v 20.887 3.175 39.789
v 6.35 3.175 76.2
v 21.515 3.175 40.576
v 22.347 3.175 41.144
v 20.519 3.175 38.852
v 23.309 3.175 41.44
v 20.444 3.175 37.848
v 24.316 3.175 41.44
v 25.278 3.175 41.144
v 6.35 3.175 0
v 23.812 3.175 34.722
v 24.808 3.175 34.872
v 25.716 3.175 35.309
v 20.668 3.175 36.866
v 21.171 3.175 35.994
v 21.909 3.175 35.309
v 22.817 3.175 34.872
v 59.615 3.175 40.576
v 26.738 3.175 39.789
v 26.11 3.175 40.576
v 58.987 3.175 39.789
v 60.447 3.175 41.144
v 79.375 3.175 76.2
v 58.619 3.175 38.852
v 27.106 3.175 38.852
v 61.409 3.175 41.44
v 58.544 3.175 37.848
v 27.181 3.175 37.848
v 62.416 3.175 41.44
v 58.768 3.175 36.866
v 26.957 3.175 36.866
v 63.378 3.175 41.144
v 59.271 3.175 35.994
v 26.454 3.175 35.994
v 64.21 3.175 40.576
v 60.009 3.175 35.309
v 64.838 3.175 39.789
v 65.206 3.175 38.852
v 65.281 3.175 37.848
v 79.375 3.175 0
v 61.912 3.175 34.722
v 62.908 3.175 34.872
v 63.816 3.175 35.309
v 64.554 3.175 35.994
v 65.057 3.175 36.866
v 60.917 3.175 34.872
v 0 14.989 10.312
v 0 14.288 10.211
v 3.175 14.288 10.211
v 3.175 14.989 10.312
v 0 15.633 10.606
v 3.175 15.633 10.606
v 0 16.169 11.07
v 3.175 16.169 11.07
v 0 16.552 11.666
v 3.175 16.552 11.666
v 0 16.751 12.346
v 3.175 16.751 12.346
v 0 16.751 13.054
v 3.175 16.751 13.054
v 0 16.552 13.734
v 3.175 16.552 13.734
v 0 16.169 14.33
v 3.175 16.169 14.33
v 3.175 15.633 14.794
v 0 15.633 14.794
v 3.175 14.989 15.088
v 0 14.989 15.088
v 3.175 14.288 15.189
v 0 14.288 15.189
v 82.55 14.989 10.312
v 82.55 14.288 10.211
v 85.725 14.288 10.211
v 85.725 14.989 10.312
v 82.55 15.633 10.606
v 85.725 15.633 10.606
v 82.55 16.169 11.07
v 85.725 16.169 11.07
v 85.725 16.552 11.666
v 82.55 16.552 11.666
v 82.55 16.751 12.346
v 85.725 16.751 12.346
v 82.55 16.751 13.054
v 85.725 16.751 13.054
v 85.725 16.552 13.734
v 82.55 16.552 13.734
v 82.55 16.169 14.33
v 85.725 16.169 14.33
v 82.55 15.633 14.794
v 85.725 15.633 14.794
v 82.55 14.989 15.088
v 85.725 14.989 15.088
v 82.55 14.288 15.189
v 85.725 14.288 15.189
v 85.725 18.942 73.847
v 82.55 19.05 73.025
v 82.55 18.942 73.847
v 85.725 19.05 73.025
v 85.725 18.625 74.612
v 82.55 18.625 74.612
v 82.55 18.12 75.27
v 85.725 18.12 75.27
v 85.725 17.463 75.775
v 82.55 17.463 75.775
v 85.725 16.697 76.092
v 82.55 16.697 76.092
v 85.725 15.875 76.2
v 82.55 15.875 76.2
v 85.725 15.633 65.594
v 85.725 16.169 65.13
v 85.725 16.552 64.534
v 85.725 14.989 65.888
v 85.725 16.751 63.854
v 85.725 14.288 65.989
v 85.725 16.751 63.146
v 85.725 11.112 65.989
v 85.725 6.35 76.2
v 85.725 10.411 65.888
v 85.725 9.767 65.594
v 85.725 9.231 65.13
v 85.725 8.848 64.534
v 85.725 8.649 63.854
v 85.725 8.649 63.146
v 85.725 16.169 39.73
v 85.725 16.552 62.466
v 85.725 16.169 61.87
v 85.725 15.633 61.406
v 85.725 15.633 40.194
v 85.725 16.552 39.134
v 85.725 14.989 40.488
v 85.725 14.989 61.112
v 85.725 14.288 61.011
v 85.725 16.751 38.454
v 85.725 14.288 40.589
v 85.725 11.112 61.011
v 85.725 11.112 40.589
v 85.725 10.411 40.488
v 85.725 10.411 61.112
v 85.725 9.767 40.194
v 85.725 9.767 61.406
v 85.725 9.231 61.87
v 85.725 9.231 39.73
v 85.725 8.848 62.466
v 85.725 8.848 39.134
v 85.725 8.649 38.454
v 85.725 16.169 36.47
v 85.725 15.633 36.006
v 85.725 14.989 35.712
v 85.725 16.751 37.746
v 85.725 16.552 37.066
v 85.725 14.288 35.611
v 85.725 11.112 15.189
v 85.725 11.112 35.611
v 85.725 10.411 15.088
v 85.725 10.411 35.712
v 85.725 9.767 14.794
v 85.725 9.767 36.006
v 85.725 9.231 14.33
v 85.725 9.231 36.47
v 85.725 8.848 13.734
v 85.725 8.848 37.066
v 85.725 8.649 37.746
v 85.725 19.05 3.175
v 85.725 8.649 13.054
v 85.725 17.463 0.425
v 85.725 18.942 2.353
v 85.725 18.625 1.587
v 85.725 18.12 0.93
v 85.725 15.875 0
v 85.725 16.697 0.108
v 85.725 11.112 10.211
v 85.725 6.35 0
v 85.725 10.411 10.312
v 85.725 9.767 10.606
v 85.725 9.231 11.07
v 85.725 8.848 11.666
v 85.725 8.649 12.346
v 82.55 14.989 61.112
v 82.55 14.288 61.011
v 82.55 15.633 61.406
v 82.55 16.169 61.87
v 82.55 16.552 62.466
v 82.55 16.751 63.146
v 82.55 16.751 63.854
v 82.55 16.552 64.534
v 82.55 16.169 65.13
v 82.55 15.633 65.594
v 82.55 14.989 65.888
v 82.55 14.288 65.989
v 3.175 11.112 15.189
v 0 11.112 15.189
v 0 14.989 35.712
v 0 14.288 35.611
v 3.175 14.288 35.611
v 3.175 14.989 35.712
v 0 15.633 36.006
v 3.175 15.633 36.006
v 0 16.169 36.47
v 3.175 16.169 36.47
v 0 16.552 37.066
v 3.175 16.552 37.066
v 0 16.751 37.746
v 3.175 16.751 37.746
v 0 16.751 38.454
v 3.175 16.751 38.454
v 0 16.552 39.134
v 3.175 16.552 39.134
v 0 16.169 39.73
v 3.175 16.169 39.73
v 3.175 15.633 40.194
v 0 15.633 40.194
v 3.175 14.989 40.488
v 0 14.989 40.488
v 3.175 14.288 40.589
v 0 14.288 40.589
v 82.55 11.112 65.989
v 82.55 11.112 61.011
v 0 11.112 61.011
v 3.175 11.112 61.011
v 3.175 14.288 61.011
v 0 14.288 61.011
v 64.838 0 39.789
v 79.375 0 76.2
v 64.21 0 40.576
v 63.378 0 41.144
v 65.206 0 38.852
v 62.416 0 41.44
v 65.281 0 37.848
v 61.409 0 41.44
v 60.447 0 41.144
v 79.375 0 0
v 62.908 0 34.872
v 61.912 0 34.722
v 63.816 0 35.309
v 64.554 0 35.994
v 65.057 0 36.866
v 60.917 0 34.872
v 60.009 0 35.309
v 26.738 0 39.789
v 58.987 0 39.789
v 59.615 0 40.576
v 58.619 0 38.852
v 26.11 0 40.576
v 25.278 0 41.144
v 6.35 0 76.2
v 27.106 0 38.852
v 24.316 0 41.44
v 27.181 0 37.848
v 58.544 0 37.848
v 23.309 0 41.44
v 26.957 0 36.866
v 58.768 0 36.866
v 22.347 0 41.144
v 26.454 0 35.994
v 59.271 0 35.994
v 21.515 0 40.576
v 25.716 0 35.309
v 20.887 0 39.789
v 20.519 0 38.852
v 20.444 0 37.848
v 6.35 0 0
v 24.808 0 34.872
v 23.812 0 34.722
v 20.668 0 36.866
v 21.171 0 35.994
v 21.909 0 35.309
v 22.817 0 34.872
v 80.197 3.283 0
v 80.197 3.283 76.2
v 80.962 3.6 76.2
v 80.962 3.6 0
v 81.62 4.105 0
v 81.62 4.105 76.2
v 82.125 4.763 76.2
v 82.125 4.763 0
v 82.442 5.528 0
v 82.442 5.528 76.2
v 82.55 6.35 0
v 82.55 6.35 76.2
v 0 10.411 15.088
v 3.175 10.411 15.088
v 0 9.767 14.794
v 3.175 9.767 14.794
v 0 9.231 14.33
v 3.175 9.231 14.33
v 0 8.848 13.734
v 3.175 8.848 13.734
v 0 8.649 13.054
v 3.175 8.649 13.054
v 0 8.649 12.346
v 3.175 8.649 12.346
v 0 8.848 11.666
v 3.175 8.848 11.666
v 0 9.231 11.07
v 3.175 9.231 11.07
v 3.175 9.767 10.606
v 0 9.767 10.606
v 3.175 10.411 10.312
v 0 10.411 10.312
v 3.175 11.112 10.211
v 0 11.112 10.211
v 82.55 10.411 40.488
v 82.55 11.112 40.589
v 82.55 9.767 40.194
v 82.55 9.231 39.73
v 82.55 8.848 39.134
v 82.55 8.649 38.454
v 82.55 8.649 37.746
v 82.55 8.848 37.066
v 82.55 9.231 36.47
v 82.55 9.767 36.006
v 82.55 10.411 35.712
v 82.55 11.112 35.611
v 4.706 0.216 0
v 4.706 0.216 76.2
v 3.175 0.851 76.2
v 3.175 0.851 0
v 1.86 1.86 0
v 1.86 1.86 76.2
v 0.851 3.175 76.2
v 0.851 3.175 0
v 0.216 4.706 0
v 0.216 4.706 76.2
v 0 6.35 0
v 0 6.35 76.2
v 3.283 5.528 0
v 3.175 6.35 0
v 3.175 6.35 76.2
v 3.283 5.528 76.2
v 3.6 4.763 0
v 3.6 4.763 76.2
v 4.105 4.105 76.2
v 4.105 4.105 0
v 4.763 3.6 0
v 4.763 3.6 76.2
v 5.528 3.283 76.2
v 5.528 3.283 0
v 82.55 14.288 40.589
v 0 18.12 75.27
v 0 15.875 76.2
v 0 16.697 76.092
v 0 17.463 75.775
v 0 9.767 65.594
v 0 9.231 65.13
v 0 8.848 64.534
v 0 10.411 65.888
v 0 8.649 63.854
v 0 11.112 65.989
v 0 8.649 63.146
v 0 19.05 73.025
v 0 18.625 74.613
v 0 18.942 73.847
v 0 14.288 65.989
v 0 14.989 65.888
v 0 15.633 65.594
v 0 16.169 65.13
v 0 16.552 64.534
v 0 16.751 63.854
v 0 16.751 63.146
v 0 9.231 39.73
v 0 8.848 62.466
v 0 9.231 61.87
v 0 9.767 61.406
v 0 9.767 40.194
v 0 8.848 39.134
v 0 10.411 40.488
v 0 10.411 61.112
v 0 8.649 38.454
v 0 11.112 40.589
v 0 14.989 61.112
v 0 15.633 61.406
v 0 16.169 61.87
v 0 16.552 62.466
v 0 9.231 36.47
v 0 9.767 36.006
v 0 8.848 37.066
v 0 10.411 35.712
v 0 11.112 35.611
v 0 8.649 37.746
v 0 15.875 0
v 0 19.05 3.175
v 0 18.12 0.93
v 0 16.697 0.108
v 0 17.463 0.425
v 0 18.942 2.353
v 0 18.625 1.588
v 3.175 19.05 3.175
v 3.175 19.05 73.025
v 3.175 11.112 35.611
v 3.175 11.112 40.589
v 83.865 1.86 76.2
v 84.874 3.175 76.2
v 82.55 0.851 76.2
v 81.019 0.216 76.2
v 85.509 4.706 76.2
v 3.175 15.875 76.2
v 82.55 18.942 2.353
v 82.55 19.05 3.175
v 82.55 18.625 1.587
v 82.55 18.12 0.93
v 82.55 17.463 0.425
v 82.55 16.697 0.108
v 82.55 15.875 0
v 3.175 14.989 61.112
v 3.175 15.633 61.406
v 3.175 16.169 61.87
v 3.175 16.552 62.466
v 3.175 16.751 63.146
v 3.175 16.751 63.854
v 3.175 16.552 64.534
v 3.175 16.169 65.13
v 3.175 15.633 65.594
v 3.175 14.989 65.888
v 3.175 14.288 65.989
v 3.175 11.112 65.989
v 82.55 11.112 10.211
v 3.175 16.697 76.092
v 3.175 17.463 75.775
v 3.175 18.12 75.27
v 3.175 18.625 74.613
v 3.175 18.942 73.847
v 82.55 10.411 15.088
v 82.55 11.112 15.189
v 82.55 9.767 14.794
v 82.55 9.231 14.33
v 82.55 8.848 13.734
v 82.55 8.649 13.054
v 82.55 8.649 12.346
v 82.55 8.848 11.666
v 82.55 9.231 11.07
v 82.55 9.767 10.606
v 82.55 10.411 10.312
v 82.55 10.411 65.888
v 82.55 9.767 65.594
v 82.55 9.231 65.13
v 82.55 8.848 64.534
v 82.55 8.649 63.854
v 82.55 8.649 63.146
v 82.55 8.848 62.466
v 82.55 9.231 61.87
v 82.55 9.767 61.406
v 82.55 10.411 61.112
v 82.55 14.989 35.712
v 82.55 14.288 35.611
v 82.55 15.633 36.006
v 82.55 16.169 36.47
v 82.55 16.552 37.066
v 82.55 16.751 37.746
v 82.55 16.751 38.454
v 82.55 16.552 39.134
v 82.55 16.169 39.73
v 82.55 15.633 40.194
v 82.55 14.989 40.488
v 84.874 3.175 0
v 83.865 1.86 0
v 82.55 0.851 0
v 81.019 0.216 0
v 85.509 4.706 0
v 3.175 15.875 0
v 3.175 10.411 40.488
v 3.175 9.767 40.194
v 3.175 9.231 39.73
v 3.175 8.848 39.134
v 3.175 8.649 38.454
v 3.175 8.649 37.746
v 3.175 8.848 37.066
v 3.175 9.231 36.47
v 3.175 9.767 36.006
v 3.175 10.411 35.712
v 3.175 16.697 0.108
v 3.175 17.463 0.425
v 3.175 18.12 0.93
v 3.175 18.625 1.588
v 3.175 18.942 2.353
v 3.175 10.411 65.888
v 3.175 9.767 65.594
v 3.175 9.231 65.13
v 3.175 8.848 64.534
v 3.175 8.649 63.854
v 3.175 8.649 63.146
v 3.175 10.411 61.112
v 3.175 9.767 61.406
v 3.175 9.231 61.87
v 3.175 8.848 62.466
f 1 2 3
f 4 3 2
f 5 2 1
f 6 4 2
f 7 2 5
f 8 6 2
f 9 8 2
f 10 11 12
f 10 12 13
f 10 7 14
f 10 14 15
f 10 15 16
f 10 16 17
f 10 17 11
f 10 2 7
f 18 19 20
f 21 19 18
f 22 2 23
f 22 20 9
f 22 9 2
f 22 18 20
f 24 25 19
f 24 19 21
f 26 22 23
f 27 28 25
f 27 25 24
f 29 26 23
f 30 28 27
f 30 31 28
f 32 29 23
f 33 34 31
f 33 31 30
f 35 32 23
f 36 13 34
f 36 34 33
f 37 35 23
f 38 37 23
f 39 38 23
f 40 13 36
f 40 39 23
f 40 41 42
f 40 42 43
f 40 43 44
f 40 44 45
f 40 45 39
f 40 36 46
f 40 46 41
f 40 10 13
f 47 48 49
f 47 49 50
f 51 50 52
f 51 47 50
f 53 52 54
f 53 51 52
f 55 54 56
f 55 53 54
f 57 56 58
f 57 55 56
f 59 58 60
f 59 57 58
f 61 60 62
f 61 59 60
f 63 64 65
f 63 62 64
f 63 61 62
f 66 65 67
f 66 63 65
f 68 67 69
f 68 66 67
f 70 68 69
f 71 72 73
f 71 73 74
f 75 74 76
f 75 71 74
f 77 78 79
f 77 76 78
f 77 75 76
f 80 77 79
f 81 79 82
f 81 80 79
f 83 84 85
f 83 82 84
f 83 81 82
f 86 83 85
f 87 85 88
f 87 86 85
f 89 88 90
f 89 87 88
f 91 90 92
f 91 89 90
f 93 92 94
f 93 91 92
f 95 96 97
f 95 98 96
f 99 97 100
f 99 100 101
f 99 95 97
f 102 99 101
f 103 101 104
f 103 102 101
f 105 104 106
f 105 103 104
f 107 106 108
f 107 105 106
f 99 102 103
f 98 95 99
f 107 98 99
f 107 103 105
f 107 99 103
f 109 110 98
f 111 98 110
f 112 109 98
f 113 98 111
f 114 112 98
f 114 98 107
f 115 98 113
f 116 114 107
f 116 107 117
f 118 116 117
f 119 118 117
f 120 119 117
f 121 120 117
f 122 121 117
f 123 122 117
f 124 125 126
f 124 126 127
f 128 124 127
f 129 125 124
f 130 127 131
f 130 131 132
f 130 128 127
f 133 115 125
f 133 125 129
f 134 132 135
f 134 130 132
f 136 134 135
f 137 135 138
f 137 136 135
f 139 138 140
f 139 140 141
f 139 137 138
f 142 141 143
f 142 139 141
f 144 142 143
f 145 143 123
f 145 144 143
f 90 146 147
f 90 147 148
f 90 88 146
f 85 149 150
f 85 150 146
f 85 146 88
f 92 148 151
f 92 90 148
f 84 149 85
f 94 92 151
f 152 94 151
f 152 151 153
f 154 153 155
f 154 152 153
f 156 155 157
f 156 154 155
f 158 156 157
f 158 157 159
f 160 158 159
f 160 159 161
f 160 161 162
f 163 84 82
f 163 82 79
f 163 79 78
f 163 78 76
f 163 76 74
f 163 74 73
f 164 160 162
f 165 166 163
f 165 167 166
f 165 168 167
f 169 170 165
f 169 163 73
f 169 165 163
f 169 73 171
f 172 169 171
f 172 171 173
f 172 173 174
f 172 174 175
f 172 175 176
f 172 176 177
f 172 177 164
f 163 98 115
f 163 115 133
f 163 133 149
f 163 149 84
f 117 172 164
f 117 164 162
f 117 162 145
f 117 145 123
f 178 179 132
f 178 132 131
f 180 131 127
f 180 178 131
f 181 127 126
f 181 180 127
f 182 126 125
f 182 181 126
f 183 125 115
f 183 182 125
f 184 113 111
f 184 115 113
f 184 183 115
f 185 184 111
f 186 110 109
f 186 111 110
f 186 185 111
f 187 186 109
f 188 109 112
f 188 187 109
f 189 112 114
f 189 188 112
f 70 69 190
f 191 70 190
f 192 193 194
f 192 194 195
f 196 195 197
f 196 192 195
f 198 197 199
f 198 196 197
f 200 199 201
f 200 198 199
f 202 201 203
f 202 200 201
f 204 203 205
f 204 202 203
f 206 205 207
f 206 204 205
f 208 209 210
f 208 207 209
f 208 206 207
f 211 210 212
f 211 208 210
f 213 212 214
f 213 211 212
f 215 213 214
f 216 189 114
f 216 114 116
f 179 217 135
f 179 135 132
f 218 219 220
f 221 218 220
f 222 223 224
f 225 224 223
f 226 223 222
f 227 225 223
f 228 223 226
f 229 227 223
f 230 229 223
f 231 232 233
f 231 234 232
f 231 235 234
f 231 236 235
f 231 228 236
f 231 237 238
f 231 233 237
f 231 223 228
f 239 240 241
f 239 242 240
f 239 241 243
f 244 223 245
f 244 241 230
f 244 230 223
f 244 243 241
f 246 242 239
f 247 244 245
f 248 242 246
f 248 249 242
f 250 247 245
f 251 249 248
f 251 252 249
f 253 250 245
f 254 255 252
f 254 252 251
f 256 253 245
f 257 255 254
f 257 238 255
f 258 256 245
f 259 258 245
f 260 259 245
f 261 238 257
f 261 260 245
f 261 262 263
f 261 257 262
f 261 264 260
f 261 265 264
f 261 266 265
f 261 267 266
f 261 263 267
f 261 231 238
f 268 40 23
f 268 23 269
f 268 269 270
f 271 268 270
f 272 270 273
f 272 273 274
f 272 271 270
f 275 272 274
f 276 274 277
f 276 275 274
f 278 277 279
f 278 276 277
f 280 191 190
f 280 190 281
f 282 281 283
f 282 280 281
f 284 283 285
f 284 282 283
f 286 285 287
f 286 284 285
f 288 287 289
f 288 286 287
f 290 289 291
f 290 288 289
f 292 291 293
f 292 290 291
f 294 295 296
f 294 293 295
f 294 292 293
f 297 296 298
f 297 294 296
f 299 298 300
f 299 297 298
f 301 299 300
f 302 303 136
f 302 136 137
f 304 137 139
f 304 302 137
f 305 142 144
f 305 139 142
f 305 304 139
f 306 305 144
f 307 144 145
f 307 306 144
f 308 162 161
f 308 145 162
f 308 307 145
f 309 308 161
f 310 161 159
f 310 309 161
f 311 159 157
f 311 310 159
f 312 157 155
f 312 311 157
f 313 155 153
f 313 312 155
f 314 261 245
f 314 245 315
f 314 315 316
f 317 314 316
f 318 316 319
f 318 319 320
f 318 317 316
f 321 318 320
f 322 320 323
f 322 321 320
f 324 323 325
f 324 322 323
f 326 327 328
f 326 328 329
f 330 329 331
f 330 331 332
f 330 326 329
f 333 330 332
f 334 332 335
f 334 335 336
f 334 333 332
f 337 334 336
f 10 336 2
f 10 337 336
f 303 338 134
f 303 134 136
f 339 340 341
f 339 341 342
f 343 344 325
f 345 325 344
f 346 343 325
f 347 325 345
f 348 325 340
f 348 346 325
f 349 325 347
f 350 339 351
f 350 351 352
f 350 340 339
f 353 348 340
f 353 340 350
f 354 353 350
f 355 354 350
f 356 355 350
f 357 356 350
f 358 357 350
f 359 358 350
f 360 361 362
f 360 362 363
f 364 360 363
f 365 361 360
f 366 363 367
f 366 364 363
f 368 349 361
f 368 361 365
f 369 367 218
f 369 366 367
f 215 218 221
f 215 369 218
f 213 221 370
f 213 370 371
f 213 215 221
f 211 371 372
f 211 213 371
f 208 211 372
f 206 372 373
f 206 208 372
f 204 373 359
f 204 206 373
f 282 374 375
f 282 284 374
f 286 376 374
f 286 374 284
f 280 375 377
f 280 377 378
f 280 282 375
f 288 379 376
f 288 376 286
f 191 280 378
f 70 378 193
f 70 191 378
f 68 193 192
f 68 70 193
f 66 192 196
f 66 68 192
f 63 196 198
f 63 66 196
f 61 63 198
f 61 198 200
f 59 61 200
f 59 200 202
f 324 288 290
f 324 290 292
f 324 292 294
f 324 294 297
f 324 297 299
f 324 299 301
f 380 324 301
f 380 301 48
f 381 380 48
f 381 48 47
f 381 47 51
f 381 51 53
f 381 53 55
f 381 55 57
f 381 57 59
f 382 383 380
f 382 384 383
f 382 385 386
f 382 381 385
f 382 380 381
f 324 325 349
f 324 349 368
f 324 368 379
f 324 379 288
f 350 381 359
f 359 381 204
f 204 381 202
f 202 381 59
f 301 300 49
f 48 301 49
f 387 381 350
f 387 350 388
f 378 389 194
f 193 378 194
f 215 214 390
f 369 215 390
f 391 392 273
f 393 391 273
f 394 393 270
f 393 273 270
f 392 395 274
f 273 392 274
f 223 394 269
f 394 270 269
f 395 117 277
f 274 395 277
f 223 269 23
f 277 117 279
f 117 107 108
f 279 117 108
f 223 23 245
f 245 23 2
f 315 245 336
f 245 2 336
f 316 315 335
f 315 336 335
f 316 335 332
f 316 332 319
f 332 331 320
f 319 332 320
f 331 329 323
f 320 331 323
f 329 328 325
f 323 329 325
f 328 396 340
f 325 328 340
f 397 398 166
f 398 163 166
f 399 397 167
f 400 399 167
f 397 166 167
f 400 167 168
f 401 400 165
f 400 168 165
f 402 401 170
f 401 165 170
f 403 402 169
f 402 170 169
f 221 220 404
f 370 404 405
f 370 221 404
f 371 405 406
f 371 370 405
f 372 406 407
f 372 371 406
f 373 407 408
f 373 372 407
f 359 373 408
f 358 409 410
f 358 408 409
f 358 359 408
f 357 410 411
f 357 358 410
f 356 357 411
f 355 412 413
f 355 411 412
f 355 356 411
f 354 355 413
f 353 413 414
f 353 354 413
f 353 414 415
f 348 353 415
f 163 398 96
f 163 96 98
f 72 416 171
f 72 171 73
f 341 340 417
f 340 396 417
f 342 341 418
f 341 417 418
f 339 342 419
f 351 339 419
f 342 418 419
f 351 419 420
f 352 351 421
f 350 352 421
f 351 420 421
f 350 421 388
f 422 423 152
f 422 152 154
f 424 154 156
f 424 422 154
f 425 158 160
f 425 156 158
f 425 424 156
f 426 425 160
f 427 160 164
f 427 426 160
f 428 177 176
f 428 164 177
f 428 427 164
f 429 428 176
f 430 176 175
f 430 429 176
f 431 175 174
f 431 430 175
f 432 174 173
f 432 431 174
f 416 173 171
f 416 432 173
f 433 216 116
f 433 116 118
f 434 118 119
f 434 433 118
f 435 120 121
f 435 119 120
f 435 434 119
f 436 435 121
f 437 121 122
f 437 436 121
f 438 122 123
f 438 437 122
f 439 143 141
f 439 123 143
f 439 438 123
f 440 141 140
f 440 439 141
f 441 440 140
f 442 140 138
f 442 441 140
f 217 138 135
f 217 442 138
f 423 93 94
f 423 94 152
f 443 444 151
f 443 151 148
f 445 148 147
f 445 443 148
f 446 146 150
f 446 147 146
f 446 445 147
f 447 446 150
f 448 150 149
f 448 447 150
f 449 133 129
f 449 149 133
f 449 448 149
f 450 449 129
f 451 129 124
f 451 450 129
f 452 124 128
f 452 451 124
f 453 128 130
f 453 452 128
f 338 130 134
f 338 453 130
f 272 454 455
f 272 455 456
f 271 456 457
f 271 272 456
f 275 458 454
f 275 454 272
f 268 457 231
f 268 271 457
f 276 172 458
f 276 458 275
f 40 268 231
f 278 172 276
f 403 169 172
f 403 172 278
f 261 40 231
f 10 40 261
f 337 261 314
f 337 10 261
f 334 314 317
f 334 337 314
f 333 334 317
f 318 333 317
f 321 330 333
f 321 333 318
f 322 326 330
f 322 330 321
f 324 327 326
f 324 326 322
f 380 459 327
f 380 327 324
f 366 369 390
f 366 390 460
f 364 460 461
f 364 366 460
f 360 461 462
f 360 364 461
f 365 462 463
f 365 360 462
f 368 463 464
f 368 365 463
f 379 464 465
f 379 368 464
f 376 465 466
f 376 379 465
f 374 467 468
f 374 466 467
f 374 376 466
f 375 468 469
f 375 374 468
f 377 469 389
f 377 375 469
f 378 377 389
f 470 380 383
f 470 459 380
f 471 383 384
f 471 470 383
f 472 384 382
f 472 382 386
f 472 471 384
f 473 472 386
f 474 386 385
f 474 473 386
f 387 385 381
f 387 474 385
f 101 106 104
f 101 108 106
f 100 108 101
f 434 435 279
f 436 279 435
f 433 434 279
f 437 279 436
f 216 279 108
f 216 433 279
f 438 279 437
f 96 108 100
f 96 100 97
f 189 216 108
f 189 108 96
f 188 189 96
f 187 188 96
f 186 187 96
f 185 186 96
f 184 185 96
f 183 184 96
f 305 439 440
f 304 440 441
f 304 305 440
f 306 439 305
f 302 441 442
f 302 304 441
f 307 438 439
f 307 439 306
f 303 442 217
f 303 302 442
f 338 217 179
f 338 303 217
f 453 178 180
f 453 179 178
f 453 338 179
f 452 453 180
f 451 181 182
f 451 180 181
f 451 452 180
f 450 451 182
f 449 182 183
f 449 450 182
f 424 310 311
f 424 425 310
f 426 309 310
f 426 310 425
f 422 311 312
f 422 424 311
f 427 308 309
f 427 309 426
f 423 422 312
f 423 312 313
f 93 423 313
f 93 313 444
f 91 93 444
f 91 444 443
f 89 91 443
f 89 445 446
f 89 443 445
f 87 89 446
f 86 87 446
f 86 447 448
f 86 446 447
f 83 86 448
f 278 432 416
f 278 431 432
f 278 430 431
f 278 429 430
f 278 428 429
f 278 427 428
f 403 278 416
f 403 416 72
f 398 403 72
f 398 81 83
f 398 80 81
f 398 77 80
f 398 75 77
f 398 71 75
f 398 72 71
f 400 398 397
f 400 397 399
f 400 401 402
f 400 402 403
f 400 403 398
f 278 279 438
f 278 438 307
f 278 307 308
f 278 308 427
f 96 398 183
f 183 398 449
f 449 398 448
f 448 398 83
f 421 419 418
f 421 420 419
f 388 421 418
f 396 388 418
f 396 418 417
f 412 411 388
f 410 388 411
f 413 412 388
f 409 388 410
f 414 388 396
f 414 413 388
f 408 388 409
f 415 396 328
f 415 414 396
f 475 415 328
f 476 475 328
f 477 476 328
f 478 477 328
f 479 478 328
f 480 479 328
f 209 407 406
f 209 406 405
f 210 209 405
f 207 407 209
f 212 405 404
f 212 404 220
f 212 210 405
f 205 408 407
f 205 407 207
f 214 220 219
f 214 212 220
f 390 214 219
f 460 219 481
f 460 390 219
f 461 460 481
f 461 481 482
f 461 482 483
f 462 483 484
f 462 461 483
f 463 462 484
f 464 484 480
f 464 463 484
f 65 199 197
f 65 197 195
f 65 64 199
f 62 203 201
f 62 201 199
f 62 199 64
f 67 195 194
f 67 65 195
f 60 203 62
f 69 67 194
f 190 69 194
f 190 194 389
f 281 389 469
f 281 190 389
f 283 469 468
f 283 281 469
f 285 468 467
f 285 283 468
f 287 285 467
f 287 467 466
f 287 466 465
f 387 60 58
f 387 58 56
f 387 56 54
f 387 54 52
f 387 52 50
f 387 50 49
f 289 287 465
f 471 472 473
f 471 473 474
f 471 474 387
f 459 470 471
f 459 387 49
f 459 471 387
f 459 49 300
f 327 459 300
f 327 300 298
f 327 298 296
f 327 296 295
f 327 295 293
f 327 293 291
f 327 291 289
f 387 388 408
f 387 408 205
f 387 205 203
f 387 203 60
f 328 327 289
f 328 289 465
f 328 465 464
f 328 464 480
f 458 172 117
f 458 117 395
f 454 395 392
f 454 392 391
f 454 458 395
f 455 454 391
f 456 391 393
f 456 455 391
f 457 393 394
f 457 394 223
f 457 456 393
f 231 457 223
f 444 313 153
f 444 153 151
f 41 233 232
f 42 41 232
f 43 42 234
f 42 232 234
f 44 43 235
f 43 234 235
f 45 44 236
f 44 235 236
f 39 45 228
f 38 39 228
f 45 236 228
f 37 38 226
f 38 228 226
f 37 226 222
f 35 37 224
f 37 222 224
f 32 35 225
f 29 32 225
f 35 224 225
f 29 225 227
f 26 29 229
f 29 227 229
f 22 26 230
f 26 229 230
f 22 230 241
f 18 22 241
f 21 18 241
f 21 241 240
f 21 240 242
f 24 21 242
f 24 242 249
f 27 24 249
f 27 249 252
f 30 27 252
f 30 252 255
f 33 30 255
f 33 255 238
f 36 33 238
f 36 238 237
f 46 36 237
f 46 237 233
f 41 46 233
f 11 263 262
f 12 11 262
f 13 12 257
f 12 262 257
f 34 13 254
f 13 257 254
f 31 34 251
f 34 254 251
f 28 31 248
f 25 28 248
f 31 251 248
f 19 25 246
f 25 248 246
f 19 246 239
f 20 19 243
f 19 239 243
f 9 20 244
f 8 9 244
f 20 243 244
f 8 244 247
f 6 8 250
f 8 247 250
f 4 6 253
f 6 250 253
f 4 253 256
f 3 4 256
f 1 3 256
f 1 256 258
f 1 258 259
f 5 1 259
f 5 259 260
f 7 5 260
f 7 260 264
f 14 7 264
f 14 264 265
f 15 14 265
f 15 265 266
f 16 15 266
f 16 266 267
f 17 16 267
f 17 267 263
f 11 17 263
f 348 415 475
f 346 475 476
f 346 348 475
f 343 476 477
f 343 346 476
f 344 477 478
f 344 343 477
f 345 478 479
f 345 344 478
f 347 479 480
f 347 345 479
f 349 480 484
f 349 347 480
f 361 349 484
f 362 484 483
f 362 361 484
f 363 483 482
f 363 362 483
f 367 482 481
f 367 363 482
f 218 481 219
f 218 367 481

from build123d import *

# Parameters (mm, degrees)
BASE_FLANGE1_DEPTH = 76.2
CUT_EXTRUDE1_DEPTH = 117.26744224
SKETCH7_R          = 3.3782
CUT_EXTRUDE2_DEPTH = 117.26744224
FILLET1_R          = 3.175


# Sheet-metal steps are written as plain solids
with BuildPart() as part:
    # Sketch1 → Base-Flange1 (new body)
    with BuildSketch(Plane.XY):
        with BuildLine():
            Line((85.725, 19.05), (85.725, 6.35))
            ThreePointArc((85.725, 6.35), (83.865128061, 1.859871939), (79.375, 0))
            Line((79.375, 0), (6.35, 0))
            ThreePointArc((6.35, 0), (1.859871939, 1.859871939), (0, 6.35))
            Line((0, 6.35), (0, 19.05))
            Line((0, 19.05), (3.175, 19.05))
            Line((3.175, 19.05), (3.175, 6.35))
            ThreePointArc((3.175, 6.35), (4.10493597, 4.10493597), (6.35, 3.175))
            Line((6.35, 3.175), (79.375, 3.175))
            ThreePointArc((79.375, 3.175), (81.62006403, 4.10493597), (82.55, 6.35))
            Line((82.55, 6.35), (82.55, 19.05))
            Line((82.55, 19.05), (85.725, 19.05))
        make_face()
    extrude(amount=BASE_FLANGE1_DEPTH)

    # Sketch6 → Cut-Extrude1 (cut, through all)
    with BuildSketch(Plane.ZY):
        with BuildLine():
            Line((35.6108, 11.1125), (35.6108, 14.2875))
            ThreePointArc((35.6108, 14.2875), (38.1, 16.7767), (40.5892, 14.2875))
            Line((40.5892, 14.2875), (40.5892, 11.1125))
            ThreePointArc((40.5892, 11.1125), (38.1, 8.6233), (35.6108, 11.1125))
        make_face()
        with BuildLine():
            Line((10.2108, 11.1125), (10.2108, 14.2875))
            ThreePointArc((10.2108, 14.2875), (12.7, 16.7767), (15.1892, 14.2875))
            Line((15.1892, 14.2875), (15.1892, 11.1125))
            ThreePointArc((15.1892, 11.1125), (12.7, 8.6233), (10.2108, 11.1125))
        make_face()
        with BuildLine():
            Line((61.0108, 11.1125), (61.0108, 14.2875))
            ThreePointArc((61.0108, 14.2875), (63.5, 16.7767), (65.9892, 14.2875))
            Line((65.9892, 14.2875), (65.9892, 11.1125))
            ThreePointArc((65.9892, 11.1125), (63.5, 8.6233), (61.0108, 11.1125))
        make_face()
    extrude(amount=-CUT_EXTRUDE1_DEPTH, mode=Mode.SUBTRACT)

    # Sketch7 → Cut-Extrude2 (cut, through all)
    with BuildSketch(Plane.XZ):
        with Locations(Location((61.9125, 38.1, 0), (0, 0, 270))):
            Circle(SKETCH7_R)
        with Locations(Location((23.8125, 38.1, 0), (0, 0, 270))):
            Circle(SKETCH7_R)
    extrude(amount=-CUT_EXTRUDE2_DEPTH, mode=Mode.SUBTRACT)

    # Fillet1
    fillet1_edges = [part.edges().sort_by_distance(p)[0] for p in [
        (1.5875, 19.05, 0),
        (84.1375, 19.05, 0),
        (1.5875, 19.05, 76.2),
        (84.1375, 19.05, 76.2),
    ]]
    fillet(fillet1_edges, radius=FILLET1_R)


solid = part.part
